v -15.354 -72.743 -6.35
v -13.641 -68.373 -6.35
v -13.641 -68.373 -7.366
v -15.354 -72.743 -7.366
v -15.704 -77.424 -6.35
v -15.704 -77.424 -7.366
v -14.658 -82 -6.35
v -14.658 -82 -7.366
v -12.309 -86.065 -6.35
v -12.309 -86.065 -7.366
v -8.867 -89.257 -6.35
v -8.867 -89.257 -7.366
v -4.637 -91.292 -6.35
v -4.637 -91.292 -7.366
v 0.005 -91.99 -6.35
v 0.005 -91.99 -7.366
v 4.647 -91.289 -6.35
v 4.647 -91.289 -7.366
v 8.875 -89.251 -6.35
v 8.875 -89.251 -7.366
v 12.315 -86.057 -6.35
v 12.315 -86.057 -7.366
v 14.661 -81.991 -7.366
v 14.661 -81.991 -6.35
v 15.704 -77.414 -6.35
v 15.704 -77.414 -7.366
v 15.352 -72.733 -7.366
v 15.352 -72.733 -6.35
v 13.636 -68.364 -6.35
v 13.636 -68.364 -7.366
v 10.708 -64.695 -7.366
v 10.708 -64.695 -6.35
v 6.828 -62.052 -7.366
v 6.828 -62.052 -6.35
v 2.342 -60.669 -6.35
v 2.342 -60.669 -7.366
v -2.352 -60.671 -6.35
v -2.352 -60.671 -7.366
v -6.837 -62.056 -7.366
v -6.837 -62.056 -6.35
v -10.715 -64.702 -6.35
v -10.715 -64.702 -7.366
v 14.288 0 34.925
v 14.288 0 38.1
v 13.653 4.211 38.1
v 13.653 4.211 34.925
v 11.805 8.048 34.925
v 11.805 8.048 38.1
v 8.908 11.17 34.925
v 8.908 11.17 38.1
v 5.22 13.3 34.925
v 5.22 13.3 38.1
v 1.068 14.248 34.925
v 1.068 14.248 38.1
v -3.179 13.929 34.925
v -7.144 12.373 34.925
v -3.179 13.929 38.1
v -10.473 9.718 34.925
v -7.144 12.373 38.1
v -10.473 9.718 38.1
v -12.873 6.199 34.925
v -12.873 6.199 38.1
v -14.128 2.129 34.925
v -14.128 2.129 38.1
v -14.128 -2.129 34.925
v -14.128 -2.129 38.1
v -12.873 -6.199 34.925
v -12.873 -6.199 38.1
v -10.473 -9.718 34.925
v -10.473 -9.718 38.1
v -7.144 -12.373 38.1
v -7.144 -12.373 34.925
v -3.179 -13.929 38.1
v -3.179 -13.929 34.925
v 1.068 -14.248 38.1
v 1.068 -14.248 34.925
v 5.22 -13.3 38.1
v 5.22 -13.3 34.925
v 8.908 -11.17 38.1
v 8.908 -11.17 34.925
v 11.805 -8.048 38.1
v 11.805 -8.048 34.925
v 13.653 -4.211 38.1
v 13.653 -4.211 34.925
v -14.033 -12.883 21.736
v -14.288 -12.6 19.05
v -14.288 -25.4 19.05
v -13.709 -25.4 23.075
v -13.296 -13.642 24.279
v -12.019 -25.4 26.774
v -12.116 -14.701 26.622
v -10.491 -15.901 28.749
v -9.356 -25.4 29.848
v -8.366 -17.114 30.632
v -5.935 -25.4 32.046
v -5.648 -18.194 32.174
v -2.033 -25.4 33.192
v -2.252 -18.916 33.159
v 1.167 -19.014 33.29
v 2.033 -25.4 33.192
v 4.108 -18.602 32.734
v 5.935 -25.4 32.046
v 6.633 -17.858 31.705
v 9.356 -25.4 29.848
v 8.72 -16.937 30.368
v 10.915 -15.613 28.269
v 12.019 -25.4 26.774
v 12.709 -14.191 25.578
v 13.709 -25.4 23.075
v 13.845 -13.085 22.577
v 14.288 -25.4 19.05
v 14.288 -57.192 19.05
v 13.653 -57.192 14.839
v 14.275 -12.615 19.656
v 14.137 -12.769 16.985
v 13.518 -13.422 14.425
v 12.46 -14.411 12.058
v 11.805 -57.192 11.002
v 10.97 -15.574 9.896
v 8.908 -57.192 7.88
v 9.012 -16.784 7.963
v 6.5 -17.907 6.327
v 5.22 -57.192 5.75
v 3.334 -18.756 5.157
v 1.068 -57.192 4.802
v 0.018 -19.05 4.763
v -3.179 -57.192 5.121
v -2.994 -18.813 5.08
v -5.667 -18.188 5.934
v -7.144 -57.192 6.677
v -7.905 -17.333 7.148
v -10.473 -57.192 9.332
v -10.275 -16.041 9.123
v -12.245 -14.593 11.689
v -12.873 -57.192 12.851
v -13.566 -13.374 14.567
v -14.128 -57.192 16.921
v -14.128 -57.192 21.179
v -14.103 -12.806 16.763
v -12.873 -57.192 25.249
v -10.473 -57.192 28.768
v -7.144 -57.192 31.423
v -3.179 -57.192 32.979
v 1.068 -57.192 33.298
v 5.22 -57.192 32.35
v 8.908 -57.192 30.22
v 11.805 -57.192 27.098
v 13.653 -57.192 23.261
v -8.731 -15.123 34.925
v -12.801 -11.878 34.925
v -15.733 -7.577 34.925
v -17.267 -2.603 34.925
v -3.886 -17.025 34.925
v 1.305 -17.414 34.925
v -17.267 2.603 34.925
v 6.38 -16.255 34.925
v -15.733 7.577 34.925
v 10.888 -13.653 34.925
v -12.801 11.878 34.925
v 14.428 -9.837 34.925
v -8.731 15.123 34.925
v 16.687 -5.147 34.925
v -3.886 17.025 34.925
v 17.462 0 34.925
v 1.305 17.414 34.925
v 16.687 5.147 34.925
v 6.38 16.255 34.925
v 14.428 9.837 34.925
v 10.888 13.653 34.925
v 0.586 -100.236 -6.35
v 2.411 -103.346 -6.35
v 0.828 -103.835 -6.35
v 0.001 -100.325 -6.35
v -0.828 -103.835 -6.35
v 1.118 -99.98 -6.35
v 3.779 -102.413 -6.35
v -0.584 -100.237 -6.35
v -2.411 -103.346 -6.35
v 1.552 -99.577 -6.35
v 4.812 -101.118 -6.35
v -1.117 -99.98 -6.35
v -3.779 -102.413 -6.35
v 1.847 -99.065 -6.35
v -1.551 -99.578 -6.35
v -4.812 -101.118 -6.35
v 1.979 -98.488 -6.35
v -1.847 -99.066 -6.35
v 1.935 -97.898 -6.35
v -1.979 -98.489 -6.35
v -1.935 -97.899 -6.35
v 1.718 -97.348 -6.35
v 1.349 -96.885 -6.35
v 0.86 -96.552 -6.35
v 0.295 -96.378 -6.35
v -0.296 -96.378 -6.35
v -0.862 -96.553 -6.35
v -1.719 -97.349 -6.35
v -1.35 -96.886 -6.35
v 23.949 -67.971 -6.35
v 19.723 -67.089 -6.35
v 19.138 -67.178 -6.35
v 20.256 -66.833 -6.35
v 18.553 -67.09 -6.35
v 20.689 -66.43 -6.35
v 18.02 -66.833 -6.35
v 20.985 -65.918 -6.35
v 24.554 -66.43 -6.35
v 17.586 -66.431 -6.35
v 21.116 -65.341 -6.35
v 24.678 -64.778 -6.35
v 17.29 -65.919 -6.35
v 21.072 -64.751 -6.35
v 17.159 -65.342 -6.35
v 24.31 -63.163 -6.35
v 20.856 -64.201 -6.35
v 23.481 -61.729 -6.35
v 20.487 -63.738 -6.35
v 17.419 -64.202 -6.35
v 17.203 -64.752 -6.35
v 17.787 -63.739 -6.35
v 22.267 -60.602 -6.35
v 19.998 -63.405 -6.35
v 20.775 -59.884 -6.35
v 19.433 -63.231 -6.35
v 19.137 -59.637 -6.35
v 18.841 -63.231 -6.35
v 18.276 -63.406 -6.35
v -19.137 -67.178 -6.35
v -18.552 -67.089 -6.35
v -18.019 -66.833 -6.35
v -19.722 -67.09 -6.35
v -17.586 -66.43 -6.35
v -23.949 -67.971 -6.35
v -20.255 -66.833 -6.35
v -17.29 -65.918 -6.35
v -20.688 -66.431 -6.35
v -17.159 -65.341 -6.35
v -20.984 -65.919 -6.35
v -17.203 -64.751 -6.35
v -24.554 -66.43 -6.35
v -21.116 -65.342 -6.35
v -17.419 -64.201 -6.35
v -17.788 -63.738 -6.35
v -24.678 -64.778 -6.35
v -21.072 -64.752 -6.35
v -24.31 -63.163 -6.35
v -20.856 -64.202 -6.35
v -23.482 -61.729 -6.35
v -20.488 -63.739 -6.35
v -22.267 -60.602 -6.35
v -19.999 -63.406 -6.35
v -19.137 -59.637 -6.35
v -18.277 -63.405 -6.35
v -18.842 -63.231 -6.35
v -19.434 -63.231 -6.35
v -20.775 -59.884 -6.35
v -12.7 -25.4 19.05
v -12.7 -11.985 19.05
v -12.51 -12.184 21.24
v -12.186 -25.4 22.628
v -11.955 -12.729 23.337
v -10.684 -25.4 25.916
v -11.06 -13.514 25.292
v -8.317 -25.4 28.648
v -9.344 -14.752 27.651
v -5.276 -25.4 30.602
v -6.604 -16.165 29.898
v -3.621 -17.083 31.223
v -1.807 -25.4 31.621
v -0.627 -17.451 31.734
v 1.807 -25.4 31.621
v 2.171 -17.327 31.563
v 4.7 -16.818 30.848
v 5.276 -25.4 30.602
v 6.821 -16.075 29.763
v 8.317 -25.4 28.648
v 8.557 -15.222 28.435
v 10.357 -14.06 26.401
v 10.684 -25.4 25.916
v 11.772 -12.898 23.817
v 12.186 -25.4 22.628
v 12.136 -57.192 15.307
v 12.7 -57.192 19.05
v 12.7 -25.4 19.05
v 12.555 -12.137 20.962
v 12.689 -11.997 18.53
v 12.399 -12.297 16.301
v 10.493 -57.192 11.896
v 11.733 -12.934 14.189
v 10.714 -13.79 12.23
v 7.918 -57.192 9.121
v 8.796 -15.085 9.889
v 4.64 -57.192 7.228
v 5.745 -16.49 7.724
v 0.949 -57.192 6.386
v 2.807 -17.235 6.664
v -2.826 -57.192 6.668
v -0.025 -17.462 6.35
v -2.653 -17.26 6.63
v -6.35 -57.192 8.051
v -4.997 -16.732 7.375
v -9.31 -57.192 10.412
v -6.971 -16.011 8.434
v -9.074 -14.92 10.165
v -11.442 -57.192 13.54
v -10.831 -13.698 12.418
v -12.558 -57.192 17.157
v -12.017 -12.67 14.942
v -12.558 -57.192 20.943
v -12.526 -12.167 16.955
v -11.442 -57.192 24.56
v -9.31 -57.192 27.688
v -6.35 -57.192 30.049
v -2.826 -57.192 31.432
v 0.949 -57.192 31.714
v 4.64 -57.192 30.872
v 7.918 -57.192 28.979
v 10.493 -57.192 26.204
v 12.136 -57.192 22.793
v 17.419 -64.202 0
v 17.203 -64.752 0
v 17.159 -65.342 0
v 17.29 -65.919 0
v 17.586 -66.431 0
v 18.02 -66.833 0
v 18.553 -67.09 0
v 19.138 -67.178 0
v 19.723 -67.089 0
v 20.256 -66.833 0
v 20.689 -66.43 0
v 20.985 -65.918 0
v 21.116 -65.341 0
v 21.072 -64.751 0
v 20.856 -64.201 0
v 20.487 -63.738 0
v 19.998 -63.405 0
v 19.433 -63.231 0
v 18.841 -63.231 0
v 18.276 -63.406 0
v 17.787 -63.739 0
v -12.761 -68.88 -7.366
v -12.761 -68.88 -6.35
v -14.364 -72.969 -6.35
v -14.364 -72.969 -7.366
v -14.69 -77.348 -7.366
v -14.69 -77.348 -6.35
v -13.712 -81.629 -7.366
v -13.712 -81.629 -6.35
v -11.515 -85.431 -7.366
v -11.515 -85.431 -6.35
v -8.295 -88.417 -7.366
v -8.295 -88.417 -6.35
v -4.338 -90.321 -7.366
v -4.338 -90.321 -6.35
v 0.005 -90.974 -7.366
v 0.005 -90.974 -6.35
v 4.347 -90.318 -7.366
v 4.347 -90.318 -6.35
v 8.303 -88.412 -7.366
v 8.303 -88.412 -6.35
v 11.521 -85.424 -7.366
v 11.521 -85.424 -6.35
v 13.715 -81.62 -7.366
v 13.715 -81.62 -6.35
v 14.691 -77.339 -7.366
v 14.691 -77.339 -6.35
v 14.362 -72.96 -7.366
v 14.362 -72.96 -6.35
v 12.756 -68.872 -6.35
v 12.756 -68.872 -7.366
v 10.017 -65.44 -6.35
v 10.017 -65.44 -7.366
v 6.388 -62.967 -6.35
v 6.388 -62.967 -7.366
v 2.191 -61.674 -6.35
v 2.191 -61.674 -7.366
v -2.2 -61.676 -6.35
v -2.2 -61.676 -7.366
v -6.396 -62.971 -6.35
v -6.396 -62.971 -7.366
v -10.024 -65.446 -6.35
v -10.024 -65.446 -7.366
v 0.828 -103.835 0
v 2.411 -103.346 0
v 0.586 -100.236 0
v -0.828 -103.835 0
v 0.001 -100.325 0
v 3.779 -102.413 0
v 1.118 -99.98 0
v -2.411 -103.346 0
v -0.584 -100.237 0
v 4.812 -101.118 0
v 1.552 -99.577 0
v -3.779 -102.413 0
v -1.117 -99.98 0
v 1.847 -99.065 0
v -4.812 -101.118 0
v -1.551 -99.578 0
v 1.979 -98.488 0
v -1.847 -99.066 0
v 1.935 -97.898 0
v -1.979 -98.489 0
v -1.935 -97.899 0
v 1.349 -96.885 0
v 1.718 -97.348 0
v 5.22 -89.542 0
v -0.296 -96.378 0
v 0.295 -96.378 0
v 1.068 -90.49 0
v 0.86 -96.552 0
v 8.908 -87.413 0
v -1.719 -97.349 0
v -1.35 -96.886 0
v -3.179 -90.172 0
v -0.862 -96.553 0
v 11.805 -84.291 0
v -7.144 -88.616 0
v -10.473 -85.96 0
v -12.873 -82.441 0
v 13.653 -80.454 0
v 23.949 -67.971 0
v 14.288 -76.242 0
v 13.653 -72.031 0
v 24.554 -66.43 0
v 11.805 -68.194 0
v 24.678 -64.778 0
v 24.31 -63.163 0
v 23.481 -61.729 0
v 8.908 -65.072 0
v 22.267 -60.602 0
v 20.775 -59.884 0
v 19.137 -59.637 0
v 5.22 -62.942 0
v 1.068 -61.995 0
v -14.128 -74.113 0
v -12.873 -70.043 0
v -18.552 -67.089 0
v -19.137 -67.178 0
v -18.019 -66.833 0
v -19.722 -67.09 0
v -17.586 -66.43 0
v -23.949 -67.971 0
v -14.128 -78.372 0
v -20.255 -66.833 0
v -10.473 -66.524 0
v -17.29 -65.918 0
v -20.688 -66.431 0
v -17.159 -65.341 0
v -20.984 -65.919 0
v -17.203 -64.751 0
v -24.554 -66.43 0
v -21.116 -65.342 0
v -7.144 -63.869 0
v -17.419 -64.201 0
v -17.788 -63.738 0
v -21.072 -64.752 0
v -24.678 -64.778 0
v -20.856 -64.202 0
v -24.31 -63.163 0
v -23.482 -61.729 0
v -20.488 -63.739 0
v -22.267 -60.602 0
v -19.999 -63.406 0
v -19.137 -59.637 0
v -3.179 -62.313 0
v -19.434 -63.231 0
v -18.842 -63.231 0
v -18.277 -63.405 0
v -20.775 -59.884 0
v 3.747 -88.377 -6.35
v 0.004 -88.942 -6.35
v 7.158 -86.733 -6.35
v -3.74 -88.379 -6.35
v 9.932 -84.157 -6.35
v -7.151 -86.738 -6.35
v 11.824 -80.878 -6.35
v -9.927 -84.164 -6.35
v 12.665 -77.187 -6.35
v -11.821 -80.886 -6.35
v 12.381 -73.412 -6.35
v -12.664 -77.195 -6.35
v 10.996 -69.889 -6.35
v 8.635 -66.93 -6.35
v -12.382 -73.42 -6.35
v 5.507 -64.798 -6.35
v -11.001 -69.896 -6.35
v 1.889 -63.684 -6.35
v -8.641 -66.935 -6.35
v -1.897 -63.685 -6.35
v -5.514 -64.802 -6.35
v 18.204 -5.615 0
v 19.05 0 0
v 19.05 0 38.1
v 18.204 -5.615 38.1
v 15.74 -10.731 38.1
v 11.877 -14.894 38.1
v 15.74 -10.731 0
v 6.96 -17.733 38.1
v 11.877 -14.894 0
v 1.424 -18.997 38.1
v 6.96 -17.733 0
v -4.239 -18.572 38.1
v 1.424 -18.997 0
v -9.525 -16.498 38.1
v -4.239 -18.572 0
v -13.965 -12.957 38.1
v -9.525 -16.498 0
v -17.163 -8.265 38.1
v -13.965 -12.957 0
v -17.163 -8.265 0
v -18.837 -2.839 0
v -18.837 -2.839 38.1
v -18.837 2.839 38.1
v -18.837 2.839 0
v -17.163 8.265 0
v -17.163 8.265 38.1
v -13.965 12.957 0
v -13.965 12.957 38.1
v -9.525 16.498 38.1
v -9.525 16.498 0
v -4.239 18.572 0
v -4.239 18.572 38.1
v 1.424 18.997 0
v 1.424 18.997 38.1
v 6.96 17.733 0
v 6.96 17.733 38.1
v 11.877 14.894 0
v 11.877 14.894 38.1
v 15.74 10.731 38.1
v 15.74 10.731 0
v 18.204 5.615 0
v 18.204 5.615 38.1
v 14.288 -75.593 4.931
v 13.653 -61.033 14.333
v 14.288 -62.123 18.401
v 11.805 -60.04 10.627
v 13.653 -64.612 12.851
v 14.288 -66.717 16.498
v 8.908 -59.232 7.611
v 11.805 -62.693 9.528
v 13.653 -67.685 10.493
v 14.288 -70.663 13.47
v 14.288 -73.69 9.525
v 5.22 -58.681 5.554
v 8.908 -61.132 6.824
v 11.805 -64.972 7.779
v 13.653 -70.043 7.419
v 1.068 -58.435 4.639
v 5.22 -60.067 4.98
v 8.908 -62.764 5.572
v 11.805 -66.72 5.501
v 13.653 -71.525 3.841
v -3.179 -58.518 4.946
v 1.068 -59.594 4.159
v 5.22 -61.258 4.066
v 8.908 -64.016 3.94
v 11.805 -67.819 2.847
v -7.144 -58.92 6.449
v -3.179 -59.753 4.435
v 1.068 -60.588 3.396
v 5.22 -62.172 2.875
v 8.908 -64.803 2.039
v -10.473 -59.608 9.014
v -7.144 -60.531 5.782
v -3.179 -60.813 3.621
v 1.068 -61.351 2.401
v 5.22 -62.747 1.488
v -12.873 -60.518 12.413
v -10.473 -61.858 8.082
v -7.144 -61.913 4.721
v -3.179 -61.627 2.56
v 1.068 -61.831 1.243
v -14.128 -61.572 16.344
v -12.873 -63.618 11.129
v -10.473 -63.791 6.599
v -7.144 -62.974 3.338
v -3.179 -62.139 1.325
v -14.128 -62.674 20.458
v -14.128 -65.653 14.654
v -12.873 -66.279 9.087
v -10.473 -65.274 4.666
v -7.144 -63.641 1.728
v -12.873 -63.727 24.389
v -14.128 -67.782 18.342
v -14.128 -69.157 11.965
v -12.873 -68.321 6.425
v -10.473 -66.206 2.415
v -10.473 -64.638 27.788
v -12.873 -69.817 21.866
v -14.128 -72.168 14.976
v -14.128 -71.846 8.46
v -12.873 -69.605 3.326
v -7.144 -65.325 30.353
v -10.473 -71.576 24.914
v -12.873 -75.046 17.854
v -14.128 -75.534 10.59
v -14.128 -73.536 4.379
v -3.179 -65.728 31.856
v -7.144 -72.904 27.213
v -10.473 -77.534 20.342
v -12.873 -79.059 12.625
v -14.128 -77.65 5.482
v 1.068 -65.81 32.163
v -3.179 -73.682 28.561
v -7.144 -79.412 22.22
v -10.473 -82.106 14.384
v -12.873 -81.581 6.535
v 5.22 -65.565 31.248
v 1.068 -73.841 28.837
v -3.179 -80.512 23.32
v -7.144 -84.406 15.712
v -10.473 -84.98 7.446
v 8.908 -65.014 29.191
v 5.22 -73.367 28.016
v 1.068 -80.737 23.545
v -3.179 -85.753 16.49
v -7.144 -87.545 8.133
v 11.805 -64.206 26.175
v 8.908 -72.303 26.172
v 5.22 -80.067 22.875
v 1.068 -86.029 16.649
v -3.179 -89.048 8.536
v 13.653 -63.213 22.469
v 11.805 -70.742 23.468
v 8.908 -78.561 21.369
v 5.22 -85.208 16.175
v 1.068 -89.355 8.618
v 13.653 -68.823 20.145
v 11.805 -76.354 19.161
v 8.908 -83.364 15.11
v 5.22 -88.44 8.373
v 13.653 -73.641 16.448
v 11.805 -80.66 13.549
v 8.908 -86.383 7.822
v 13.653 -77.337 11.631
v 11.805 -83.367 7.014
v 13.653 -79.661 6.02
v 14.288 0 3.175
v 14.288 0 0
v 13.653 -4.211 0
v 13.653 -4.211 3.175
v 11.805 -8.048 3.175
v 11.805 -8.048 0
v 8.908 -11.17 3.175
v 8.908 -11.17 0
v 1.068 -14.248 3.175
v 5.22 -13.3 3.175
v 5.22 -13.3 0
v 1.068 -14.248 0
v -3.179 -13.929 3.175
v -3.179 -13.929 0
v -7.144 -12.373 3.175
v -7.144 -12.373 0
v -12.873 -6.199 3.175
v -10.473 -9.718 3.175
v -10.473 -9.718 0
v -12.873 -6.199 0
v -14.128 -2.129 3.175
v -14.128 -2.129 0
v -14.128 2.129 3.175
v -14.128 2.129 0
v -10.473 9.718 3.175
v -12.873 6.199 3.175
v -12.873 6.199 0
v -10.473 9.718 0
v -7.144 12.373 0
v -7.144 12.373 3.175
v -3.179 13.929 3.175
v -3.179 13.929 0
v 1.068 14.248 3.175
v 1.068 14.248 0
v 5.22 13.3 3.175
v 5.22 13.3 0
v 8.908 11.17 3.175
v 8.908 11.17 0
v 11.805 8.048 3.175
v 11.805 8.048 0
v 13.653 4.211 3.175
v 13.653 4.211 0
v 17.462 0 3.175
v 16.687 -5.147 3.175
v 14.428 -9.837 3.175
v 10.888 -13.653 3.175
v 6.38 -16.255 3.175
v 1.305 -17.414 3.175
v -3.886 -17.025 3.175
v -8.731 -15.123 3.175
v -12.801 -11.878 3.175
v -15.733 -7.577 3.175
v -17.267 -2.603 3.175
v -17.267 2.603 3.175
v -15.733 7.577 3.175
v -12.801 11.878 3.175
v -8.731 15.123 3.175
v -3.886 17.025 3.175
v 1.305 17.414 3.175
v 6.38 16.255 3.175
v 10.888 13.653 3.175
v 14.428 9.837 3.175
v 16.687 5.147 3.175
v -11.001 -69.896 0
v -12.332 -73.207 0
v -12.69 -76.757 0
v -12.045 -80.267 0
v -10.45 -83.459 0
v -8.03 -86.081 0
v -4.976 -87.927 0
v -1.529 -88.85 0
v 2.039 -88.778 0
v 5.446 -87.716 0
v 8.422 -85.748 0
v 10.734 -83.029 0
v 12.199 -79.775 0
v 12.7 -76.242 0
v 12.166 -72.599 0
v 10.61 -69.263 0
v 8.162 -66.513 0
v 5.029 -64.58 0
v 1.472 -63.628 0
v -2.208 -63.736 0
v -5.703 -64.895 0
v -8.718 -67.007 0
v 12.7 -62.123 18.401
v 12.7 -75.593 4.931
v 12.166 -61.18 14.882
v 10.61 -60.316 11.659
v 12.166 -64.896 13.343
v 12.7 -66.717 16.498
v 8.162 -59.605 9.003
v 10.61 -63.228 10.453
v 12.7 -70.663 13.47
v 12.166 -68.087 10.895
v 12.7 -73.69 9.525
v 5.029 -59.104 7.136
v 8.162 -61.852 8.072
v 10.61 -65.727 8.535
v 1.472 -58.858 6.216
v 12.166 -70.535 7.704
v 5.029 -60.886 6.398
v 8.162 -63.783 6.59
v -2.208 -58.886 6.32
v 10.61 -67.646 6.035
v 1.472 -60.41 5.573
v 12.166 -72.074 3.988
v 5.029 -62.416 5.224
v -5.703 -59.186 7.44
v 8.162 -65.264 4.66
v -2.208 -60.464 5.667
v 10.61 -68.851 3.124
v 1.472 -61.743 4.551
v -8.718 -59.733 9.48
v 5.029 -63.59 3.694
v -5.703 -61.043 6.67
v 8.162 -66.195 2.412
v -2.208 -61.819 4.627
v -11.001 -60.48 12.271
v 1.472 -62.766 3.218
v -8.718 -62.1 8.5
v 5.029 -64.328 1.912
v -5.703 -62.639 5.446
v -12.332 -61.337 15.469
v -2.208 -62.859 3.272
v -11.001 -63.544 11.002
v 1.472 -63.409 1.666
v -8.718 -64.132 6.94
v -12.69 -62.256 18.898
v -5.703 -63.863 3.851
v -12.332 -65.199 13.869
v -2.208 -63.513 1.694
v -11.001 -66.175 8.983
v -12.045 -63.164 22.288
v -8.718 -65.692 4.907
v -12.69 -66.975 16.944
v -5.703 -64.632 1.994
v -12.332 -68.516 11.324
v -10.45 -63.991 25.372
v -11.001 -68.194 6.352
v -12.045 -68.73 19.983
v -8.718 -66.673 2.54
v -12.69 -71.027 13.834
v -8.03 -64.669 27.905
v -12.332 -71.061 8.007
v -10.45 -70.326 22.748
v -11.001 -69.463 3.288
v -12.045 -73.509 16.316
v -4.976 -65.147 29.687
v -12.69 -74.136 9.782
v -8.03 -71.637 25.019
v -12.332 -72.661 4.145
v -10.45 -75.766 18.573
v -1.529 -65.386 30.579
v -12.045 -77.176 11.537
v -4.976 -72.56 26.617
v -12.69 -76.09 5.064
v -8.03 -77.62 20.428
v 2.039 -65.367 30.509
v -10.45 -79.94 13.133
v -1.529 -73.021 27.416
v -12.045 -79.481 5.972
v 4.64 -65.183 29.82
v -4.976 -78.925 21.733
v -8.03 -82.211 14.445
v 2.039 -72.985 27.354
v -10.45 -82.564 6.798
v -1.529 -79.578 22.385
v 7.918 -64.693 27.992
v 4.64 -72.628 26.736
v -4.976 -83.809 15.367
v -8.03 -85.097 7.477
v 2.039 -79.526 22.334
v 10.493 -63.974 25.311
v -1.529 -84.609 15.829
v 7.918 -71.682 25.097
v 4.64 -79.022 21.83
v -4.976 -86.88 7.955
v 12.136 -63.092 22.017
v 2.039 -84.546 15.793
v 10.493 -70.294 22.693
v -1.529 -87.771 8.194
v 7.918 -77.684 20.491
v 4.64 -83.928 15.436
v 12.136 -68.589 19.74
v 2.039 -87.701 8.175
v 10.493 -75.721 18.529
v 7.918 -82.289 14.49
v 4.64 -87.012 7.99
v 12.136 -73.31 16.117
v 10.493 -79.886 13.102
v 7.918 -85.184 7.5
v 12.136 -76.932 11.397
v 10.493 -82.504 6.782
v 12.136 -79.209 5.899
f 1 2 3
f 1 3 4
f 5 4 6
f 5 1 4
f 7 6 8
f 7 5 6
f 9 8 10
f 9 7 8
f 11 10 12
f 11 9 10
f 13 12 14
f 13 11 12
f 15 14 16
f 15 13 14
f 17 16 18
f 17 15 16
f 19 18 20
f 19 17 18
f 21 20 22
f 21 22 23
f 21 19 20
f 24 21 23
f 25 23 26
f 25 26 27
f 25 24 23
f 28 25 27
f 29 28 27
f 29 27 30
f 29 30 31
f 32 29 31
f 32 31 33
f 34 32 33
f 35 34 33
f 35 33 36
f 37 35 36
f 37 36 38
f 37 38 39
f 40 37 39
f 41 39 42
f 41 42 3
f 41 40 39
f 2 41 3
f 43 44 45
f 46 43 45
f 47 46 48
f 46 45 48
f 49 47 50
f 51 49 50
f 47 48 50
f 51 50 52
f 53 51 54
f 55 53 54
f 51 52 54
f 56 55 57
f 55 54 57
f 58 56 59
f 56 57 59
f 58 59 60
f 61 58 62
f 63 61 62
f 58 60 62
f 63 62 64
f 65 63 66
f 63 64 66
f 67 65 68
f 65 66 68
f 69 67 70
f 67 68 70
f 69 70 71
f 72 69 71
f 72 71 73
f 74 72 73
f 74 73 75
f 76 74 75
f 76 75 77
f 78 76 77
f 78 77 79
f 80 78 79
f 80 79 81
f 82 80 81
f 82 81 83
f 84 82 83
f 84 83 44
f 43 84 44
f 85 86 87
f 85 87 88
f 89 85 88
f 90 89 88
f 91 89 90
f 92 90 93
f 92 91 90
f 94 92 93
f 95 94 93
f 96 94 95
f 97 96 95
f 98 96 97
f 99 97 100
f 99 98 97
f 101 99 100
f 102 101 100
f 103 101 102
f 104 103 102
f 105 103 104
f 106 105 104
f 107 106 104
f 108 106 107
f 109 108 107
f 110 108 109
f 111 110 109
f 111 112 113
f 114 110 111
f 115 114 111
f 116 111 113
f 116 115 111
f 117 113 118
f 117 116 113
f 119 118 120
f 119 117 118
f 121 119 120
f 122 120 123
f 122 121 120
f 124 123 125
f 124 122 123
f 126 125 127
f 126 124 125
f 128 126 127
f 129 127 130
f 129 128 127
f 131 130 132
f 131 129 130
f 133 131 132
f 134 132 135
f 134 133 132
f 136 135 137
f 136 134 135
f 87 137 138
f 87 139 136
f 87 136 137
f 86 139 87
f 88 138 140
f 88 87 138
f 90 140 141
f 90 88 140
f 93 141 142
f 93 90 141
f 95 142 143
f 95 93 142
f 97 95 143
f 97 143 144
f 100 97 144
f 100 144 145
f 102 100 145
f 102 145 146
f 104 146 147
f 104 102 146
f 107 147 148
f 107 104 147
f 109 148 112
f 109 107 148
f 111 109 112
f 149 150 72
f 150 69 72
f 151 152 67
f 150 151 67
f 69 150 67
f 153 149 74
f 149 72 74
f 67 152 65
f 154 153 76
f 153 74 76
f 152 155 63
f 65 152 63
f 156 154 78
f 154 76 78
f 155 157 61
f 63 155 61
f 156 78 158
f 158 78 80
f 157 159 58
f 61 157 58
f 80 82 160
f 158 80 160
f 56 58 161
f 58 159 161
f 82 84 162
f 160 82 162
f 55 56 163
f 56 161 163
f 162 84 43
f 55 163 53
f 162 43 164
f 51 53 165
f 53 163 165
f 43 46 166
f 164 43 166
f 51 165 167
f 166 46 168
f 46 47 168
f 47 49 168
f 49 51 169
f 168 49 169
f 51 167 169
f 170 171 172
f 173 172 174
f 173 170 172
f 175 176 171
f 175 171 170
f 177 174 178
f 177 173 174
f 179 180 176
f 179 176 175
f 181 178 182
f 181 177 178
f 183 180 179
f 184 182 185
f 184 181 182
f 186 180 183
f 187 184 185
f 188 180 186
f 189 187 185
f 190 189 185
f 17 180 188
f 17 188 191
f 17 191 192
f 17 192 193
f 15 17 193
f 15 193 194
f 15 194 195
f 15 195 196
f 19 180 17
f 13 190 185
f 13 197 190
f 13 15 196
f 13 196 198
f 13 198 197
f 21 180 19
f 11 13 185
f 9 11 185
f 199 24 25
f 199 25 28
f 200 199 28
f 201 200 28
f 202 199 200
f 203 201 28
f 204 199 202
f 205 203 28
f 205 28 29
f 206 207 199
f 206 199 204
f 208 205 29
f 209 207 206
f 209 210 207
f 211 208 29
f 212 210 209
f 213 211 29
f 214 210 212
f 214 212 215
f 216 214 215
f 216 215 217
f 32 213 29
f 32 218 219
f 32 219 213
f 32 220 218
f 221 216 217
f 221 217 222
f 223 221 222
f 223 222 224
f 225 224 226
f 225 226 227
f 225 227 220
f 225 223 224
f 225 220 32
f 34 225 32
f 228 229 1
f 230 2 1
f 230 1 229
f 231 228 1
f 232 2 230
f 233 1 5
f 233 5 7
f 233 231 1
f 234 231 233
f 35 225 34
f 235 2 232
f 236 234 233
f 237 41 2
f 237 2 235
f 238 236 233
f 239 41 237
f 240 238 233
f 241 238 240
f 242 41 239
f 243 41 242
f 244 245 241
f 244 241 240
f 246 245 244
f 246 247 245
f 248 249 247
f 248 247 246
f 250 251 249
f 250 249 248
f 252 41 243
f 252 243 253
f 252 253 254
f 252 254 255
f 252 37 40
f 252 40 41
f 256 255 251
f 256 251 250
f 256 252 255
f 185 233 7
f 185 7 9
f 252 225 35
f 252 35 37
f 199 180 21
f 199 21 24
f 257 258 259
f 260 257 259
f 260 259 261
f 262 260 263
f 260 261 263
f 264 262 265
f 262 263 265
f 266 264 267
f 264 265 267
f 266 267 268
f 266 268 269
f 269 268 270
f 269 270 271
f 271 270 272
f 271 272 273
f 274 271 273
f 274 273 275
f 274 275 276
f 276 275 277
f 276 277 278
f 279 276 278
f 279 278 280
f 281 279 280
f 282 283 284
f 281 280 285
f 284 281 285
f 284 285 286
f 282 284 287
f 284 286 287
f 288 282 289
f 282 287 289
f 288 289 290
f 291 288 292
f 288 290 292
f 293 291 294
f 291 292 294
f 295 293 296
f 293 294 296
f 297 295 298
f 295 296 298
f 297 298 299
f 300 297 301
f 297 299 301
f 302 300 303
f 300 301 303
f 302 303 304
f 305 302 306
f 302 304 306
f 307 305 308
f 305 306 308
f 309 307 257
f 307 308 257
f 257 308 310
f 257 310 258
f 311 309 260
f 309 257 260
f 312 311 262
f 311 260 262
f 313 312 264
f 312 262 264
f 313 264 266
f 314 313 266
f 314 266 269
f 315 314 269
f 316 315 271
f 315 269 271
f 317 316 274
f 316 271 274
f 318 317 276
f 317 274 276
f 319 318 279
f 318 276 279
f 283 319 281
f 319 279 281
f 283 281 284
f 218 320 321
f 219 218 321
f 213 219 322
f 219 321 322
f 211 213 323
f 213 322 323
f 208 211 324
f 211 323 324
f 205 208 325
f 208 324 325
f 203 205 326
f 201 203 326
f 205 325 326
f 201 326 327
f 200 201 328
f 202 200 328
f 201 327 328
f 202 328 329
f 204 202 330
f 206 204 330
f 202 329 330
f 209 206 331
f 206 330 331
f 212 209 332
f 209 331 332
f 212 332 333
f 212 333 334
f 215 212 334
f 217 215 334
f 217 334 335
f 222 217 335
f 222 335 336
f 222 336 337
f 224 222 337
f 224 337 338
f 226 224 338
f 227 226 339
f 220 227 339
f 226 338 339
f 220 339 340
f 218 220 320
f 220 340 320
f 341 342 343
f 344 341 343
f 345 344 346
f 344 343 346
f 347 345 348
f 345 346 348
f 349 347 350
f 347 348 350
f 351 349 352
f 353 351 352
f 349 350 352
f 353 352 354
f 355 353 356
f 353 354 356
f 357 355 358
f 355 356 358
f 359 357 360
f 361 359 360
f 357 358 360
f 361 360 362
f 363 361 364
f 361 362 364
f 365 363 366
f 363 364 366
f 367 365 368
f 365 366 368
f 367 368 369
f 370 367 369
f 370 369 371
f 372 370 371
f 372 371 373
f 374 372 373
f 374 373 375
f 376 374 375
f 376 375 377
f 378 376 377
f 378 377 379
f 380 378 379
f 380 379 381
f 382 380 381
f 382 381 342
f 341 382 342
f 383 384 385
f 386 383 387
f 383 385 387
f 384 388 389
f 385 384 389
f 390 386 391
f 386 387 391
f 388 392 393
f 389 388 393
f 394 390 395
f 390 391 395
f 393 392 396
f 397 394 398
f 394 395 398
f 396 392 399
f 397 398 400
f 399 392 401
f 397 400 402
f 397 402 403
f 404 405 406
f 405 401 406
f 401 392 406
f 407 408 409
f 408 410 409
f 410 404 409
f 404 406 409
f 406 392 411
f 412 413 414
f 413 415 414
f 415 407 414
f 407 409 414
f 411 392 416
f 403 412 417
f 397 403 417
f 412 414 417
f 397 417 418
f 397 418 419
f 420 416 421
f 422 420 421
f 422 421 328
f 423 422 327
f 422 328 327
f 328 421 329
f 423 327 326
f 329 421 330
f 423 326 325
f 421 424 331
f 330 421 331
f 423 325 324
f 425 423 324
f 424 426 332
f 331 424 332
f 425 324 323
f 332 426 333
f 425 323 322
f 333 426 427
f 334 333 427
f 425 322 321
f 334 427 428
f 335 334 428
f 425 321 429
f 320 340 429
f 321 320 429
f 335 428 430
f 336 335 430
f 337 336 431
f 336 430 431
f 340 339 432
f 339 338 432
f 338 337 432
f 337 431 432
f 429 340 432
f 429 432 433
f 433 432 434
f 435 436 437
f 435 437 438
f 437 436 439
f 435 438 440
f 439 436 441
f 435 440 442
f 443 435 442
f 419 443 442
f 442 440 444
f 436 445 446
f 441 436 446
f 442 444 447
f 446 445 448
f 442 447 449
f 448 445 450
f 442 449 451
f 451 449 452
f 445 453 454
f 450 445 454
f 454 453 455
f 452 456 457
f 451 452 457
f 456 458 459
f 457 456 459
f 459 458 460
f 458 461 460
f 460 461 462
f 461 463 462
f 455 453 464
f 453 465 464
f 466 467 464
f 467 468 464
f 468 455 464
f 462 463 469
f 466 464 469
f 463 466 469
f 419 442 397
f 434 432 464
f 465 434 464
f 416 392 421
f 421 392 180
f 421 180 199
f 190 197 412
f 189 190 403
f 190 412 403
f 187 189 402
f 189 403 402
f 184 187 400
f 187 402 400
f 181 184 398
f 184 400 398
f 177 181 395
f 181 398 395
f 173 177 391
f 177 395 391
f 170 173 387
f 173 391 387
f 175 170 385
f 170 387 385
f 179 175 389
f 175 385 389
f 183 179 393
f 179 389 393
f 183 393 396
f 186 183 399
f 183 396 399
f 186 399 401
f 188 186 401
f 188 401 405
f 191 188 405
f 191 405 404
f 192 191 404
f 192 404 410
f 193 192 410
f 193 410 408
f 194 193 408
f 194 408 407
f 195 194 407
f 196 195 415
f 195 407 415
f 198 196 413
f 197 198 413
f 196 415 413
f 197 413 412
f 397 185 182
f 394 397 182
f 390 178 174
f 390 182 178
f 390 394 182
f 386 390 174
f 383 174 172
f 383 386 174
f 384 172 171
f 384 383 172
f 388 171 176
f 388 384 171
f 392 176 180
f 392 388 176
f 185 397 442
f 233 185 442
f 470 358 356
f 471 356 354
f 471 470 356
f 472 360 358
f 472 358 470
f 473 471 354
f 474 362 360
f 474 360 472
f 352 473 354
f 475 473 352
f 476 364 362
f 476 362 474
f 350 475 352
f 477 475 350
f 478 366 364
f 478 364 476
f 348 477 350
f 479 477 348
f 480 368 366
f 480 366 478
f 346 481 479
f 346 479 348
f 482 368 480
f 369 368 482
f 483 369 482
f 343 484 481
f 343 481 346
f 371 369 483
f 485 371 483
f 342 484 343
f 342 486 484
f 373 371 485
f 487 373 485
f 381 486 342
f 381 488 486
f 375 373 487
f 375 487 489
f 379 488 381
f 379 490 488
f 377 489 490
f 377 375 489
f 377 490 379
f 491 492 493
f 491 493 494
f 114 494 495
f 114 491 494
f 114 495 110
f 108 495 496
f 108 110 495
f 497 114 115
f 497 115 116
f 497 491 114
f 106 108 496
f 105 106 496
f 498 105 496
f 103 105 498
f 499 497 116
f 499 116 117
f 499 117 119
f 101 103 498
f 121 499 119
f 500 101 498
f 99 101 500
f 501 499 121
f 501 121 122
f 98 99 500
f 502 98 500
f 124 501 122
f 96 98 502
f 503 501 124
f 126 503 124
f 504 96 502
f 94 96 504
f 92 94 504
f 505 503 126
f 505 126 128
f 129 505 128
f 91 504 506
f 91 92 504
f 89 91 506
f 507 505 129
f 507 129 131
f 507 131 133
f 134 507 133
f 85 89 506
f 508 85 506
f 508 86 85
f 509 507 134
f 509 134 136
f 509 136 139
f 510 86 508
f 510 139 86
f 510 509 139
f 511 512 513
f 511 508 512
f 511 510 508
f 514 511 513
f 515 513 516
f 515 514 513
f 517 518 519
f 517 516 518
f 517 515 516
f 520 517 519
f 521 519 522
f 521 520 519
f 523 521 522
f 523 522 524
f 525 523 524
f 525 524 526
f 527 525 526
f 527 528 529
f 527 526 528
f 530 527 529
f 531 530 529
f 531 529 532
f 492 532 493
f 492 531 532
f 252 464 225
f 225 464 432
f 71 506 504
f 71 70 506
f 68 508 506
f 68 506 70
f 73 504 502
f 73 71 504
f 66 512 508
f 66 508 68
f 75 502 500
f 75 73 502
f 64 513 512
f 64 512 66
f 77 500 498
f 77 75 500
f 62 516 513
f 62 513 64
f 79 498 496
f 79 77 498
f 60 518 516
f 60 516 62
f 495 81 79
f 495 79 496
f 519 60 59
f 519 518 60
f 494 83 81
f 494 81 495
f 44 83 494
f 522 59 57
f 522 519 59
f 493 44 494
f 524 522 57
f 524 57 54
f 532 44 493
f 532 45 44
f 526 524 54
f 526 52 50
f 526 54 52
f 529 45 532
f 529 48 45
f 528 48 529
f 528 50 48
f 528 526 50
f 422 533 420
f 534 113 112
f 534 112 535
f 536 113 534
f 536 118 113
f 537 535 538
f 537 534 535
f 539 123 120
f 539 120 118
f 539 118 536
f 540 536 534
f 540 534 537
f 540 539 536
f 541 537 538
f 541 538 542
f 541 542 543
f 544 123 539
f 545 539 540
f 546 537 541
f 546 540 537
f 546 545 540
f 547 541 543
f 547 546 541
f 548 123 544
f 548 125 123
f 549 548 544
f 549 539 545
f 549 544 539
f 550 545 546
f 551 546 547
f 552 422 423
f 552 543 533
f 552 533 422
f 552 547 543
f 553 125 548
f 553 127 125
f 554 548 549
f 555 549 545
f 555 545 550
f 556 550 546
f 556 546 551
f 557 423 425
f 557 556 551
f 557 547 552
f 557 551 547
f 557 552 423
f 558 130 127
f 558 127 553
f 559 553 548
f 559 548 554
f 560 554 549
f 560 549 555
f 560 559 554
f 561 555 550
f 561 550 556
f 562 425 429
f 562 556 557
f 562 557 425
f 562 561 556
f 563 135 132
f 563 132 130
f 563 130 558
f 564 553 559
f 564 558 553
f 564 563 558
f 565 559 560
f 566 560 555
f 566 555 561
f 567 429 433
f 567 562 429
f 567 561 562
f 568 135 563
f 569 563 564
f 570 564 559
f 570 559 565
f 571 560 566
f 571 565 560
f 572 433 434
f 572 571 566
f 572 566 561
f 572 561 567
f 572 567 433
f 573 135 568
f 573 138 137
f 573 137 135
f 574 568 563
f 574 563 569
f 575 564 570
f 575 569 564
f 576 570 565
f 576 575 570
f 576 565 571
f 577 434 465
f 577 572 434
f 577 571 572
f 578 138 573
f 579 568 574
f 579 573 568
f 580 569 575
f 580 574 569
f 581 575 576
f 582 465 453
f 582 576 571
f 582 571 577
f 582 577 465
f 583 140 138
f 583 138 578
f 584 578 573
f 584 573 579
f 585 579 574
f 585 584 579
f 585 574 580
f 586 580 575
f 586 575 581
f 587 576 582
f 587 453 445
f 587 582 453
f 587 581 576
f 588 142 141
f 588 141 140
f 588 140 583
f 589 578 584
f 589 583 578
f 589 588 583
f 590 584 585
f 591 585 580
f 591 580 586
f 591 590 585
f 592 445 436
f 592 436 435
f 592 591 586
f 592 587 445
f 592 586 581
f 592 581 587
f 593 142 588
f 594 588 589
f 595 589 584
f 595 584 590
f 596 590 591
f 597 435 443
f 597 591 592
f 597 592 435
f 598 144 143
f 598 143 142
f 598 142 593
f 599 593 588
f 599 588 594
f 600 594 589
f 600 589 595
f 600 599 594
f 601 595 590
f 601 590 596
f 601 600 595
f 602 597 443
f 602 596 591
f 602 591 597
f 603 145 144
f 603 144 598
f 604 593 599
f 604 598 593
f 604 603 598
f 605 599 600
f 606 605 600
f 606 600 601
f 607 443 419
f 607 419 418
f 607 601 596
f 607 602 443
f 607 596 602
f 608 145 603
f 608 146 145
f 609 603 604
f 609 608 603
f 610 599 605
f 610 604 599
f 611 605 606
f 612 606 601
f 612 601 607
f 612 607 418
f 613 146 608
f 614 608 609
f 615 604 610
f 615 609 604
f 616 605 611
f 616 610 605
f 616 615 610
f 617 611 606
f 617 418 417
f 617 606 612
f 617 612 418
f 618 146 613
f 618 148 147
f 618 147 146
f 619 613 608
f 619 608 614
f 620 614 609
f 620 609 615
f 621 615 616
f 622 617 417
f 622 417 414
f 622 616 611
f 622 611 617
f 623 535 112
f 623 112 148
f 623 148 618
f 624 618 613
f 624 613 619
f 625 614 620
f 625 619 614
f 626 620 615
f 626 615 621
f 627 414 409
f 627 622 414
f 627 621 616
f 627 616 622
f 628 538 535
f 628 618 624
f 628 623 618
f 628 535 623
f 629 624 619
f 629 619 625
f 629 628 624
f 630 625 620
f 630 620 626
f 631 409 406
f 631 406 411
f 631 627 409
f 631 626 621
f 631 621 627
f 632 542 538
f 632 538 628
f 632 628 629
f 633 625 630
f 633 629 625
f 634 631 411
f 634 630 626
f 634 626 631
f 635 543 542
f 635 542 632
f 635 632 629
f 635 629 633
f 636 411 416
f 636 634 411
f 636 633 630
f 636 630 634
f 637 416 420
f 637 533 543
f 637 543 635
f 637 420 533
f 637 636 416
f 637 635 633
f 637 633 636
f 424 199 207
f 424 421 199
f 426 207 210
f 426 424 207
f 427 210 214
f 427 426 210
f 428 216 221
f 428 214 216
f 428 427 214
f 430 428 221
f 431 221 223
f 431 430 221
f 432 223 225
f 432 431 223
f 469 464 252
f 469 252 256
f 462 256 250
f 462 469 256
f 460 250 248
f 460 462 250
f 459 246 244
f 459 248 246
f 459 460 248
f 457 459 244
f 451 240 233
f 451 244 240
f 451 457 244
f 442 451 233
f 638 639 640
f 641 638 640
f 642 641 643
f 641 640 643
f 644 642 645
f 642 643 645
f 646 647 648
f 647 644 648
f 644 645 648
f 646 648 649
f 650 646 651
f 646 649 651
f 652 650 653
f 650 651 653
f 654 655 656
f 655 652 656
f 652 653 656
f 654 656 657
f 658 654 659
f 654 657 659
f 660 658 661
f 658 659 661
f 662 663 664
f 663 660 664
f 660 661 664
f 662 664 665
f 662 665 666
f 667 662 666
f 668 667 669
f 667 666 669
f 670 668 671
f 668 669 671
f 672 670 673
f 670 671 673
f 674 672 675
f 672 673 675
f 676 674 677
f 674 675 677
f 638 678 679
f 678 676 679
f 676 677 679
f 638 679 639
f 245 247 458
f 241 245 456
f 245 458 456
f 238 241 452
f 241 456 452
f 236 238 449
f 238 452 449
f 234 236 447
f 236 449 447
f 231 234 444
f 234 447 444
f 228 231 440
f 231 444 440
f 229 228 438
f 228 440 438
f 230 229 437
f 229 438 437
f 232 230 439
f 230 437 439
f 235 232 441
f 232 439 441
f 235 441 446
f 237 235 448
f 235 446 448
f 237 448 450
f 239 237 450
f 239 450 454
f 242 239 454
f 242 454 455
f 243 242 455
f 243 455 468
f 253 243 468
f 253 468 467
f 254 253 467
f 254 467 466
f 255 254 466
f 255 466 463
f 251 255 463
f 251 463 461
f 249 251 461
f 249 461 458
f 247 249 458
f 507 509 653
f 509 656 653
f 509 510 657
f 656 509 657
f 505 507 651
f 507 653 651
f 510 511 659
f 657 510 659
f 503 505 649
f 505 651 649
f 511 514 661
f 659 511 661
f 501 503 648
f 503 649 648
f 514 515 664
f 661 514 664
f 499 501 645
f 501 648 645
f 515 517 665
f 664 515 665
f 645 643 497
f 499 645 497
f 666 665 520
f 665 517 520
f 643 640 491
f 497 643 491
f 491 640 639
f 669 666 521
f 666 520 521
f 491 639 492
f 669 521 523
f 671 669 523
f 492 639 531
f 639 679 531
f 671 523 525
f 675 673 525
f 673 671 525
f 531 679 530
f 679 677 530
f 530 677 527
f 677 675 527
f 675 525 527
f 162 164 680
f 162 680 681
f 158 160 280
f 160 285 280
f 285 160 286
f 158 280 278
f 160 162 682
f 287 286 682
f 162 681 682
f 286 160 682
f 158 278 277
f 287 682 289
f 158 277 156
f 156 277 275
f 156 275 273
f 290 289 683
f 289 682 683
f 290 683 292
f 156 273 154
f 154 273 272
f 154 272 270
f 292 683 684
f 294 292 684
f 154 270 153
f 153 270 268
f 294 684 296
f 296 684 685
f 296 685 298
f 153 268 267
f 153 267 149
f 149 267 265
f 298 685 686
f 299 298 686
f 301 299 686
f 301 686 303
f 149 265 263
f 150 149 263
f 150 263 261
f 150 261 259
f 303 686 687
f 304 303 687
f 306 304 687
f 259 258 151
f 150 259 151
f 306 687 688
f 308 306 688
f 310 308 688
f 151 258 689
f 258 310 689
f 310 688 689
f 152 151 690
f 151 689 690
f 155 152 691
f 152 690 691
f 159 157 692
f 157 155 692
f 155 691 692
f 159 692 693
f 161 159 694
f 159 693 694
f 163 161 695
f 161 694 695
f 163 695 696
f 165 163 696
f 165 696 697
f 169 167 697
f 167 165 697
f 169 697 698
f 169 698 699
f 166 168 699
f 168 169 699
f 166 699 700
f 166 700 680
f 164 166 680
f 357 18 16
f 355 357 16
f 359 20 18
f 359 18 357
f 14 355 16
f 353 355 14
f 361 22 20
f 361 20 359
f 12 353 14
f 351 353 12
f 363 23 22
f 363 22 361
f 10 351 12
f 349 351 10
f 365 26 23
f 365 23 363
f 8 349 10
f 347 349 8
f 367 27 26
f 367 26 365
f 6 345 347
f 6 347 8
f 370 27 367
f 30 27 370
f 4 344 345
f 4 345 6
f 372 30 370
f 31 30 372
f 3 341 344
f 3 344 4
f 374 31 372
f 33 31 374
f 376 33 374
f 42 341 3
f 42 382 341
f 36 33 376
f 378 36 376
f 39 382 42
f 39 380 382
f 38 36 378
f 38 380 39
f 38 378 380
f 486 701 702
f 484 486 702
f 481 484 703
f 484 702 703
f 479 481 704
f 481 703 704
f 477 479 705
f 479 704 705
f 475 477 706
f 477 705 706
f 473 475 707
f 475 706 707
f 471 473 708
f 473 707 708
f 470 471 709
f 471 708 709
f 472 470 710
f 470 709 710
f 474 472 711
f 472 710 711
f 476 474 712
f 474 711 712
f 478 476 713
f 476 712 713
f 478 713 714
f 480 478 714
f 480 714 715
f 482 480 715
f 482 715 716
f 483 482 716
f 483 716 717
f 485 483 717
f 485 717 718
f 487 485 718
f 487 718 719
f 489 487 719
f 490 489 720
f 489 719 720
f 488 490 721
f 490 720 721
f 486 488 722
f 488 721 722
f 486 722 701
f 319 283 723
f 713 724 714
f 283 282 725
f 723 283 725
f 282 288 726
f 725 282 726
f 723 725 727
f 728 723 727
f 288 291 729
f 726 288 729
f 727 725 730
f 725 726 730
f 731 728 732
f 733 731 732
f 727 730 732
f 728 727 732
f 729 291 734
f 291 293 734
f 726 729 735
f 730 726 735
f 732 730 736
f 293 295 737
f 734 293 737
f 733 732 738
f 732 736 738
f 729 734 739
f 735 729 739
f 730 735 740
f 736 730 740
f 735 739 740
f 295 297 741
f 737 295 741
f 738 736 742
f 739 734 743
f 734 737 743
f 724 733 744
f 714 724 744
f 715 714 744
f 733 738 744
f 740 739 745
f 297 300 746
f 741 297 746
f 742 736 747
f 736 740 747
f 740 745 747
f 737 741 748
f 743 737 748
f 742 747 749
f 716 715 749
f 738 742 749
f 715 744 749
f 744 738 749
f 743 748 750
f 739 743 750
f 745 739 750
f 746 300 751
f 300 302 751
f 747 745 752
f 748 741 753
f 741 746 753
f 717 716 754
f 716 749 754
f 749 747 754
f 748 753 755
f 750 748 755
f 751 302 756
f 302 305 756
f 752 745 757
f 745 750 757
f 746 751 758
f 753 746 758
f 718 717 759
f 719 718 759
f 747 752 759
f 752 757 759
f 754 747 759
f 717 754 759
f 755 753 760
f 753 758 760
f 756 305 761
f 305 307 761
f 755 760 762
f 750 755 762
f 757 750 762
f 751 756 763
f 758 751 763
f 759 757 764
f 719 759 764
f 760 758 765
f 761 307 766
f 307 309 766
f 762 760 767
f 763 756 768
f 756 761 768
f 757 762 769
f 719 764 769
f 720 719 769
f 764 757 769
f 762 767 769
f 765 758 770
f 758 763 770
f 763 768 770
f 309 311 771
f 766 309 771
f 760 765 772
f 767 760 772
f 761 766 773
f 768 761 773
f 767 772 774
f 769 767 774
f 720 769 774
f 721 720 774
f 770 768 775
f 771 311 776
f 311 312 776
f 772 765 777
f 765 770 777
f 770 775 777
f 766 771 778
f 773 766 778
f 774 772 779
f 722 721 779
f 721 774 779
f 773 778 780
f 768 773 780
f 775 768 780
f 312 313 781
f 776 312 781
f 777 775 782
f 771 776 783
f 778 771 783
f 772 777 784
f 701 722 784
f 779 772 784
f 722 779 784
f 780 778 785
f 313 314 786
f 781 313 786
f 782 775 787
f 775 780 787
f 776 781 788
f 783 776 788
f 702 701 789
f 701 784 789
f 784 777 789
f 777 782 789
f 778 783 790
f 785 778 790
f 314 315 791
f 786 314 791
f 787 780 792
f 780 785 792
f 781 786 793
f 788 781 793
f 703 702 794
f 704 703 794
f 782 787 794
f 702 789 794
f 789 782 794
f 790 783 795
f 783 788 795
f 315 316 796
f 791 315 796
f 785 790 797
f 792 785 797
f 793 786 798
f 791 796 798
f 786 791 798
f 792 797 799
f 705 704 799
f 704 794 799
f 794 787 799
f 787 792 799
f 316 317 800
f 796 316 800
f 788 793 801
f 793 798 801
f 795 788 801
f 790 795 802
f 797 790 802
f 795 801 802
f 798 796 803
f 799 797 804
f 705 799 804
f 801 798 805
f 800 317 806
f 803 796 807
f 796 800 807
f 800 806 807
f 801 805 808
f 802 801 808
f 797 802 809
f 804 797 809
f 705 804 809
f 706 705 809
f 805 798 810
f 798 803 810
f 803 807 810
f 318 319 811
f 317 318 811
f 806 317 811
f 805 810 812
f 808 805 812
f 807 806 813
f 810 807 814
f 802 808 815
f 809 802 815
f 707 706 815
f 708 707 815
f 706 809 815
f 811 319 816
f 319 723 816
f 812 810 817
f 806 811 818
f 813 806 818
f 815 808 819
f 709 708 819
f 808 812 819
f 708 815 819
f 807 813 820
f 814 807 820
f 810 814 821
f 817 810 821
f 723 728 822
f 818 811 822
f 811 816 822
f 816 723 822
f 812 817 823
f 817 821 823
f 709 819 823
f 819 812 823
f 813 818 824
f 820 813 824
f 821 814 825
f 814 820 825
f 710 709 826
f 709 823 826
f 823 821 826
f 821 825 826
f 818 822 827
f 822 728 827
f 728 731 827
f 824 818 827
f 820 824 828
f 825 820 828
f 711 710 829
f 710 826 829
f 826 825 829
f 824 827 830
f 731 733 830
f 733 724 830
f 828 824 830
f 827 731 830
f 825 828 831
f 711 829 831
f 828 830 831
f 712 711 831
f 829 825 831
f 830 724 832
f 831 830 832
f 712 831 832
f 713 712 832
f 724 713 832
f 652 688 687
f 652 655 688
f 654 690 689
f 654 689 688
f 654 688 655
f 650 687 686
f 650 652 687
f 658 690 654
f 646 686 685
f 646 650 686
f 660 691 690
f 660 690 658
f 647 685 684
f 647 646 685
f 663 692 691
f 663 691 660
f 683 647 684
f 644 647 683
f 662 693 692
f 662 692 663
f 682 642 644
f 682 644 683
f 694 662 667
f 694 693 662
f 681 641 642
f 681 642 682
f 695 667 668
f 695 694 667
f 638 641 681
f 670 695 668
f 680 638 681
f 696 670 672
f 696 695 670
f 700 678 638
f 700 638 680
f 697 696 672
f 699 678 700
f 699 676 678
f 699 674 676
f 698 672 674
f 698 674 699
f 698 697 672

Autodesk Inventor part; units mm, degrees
ref_plane "YZ Plane" through (0, 0, 0) normal (1, 0, 0) x (0, 1, 0)
ref_plane "XZ Plane" through (0, 0, 0) normal (0, 1, 0) x (-1, 0, 0)
sketch "Sketch1" plane through (0, 0, 0) normal (0, 0, 1) x (1, 0, 0)
  circle A0 centre (0, 0) radius 14.2875
  circle A1 centre (0, 0) radius 17.4625
  circle A2 centre (0, 0) radius 19.05
  dimension "d0" = 28.575
  dimension "d1" = 34.925
  dimension "d2" = 38.1
extrude "Extrusion1" add sketch "Sketch1" along normal blind 38.1 contours A0 | A1 | A2
sketch "Sketch11" plane through (0, 0, 0) normal (0, 0, 1) x (1, 0, 0)
  circle A0 centre (0, 0) radius 25.908
  circle A1 centre (-38.1, -66.04) radius 12.7
  circle A2 centre (-38.1, -66.04) radius 14.732
  circle A3 centre (-38.1, -66.04) radius 15.748
  line L0 (-38.1, -66.04) -> (-49.1429, -85.181)
  line L1 (-38.1, -66.04) -> (0, 0)
  line L2 (-38.1, -66.04) -> (-49.1551, -46.9061)
  line L3 (-38.1, -66.04) -> (-16.002, -66.0329)
  circle A4 centre (-49.1429, -85.181) radius 1.9844
  circle A5 centre (-49.1551, -46.9061) radius 1.9844
  circle A6 centre (-16.002, -66.0329) radius 1.9844
  circle A7 centre (-16.002, -66.0329) radius 5.5563
  circle A8 centre (-49.1429, -85.181) radius 5.5563
  circle A9 centre (-49.1551, -46.9061) radius 5.5563
  line L4 (-54.6991, -85.1827) -> (-54.7114, -46.9079)
  line L5 (-46.3632, -89.9919) -> (-13.2223, -70.8439)
  line L6 (-13.2254, -61.2202) -> (-46.3785, -42.0934)
  line L7 (0, 0) -> (0, -25.908)
  circle A10 centre (16.002, -66.0329) radius 1.9844
  circle A11 centre (49.1551, -46.9061) radius 1.9844
  circle A12 centre (49.1429, -85.181) radius 1.9844
  line L8 (0, 0) -> (-41.3682, 23.8663)
  line L9 (0, 0) -> (24.0327, 41.6566)
  line L10 (0, 0) -> (61.3648, -35.4028)
  dimension "d137" = 51.816
  dimension "d154" = 0
  dimension "d155" = 360
  dimension "d138" = 38.1
  dimension "d139" = 66.04
  dimension "d140" = 25.4
  dimension "d141" = 29.464
  dimension "d142" = 31.496
  dimension "d143" = 22.098
  dimension "d144" = 120
  dimension "d145" = 120
  dimension "d146" = 22.098
  dimension "d147" = 22.098
  dimension "d148" = 3.9688
  dimension "d149" = 3.9688
  dimension "d150" = 3.9688
  dimension "d151" = 11.1125
  dimension "d152" = 11.1125
  dimension "d153" = 11.1125
  dimension "d159" = 90
  dimension "d160" = 90
  dimension "d161" = 180
ref_plane "Work Plane8" through (0, 0, 0) normal (0, 0, -1) x (-0.8661856, 0.4997225, 0)
sketch "Sketch12" plane through (0, 0, 0) normal (0, 0, -1) x (-0.8661856, 0.4997225, 0)
  circle A0 centre (0, 0) radius 25.908
  circle A1 centre (-38.1, -66.04) radius 12.7
  circle A2 centre (-38.1, -66.04) radius 14.732
  circle A3 centre (-38.1, -66.04) radius 15.748
  line L0 (-38.1, -66.04) -> (-49.1429, -85.181)
  line L1 (-38.1, -66.04) -> (0, 0)
  line L2 (-38.1, -66.04) -> (-49.1551, -46.9061)
  line L3 (-38.1, -66.04) -> (-16.002, -66.0329)
  circle A4 centre (-49.1429, -85.181) radius 1.9844
  circle A5 centre (-49.1551, -46.9061) radius 1.9844
  circle A6 centre (-16.002, -66.0329) radius 1.9844
  circle A7 centre (-16.002, -66.0329) radius 5.5563
  circle A8 centre (-49.1429, -85.181) radius 5.5563
  circle A9 centre (-49.1551, -46.9061) radius 5.5563
  line L4 (-54.6991, -85.1827) -> (-54.7114, -46.9079)
  line L5 (-46.3632, -89.9919) -> (-13.2223, -70.8439)
  line L6 (-13.2254, -61.2202) -> (-46.3785, -42.0934)
  line L7 (0, 0) -> (0, -25.908)
  circle A10 centre (16.002, -66.0329) radius 1.9844
  circle A11 centre (49.1551, -46.9061) radius 1.9844
  circle A12 centre (49.1429, -85.181) radius 1.9844
  dimension "d162" = 51.816
  dimension "d179" = 0
  dimension "d180" = 360
  dimension "d163" = 38.1
  dimension "d164" = 66.04
  dimension "d165" = 25.4
  dimension "d166" = 29.464
  dimension "d167" = 31.496
  dimension "d168" = 22.098
  dimension "d169" = 120
  dimension "d170" = 120
  dimension "d171" = 22.098
  dimension "d172" = 22.098
  dimension "d173" = 3.9688
  dimension "d174" = 3.9688
  dimension "d175" = 3.9688
  dimension "d176" = 11.1125
  dimension "d177" = 11.1125
  dimension "d178" = 11.1125
sketch "Sketch13" plane through (0, 0, 0) normal (0, 1, 0) x (-1, 0, 0)
  line L0 (0, 0) -> (0, 19.05)
  circle A0 centre (0, 19.05) radius 14.2875
  circle A1 centre (0, 19.05) radius 12.7
  dimension "d184" = 19.05
  dimension "d185" = 28.575
  dimension "d186" = 25.4
extrude "Extrusion4" add sketch "Sketch13" against normal blind 25.4 contours A0 | A1
shell "Shell1" thickness 1.5875 removed faces 3 at (-5.6226, 0.0883, 38.1) at (-5.6226, 0.0883, 0) at (-3.9719, -25.4, 19.2449)
extrude "Extrusion5" add sketch "Sketch1" along normal blind 3.175 contours A1
sketch "Sketch14" plane through (0, 0, 38.1) normal (0, 0, 1) x (1, 0, 0)
  circle A0 centre (0, 0) radius 14.2875
  circle A1 centre (0, 0) radius 17.4625
  circle A2 centre (0, 0) radius 19.05
  dimension "d192" = 28.575
  dimension "d193" = 34.925
  dimension "d194" = 38.1
extrude "Extrusion6" add sketch "Sketch14" against normal blind 3.175 contours A1
sketch "Sketch15" plane through (0, -25.4, 19.05) normal (0, -1, 0) x (1, 0, 0)
  circle A0 centre (0, 0) radius 12.7
  circle A1 centre (0, 0) radius 14.2875
  point P0 (0, -19.05)
  dimension "d199" = 25.4
  dimension "d200" = 28.575
sketch3d "3D Sketch4"
  line L0 (0, -25.4, 19.05) -> (0, -57.1923, 19.05)
  arc A0 (0, -57.1923, 19.05) -> (0, -76.2423, 0) centre (0, -57.1923, 0) ccw
  dimension "d198" = 19.05
sweep "Sweep1" add profiles "Sketch15" path "3D Sketch4"
extrude "Extrusion7" add sketch "Sketch12" along normal blind 6.35 contours A1 L3 A2 L0 | A1 L1 A2 L3 | L0 A2 L2 A1 | A1 L2 A2 L1 | L3 A3 L0 A2 | A2 L1 A3 L3 | L0 A3 L2 A2 | A2 L2 A3 L1 | L3 A7 L5 A8 L0 A3 | A3 L1 L6 A7 L3 | L0 A8 L4 A9 L2 A3 | A3 L2 A9 L6 L1 | A7 | A8 | A9
extrude "Extrusion8" add sketch "Sketch12" along normal blind 7.366 contours L3 A3 L0 A2 | A2 L1 A3 L3 | L0 A3 L2 A2 | A2 L2 A3 L1
equation "\"d3\" = 9.525 * scale"
equation "\"d138\" = 9.525 * d156"
equation "\"d139\" = 16.51 * d156"
equation "\"d140\" = 6.35 * d156"
equation "\"d163\" = 9.525 * d181"
equation "\"d164\" = 16.51 * d181"
equation "\"d165\" = 6.35 * d181"
equation "\"d36\" = 3.175"
equation "\"d59\" = 3.175"
equation "\"d82\" = 3.175"
equation "\"d104\" = 3.175"
equation "\"d127\" = 3.175"
equation "\"d158\" = 3.175"
equation "\"d183\" = 3.175"
equation "\"scale\" = 4"
equation "\"d156\" = 4"
equation "\"d181\" = 4"
properties part number "Intake_Manifold_2" material "Aluminum 6061"
